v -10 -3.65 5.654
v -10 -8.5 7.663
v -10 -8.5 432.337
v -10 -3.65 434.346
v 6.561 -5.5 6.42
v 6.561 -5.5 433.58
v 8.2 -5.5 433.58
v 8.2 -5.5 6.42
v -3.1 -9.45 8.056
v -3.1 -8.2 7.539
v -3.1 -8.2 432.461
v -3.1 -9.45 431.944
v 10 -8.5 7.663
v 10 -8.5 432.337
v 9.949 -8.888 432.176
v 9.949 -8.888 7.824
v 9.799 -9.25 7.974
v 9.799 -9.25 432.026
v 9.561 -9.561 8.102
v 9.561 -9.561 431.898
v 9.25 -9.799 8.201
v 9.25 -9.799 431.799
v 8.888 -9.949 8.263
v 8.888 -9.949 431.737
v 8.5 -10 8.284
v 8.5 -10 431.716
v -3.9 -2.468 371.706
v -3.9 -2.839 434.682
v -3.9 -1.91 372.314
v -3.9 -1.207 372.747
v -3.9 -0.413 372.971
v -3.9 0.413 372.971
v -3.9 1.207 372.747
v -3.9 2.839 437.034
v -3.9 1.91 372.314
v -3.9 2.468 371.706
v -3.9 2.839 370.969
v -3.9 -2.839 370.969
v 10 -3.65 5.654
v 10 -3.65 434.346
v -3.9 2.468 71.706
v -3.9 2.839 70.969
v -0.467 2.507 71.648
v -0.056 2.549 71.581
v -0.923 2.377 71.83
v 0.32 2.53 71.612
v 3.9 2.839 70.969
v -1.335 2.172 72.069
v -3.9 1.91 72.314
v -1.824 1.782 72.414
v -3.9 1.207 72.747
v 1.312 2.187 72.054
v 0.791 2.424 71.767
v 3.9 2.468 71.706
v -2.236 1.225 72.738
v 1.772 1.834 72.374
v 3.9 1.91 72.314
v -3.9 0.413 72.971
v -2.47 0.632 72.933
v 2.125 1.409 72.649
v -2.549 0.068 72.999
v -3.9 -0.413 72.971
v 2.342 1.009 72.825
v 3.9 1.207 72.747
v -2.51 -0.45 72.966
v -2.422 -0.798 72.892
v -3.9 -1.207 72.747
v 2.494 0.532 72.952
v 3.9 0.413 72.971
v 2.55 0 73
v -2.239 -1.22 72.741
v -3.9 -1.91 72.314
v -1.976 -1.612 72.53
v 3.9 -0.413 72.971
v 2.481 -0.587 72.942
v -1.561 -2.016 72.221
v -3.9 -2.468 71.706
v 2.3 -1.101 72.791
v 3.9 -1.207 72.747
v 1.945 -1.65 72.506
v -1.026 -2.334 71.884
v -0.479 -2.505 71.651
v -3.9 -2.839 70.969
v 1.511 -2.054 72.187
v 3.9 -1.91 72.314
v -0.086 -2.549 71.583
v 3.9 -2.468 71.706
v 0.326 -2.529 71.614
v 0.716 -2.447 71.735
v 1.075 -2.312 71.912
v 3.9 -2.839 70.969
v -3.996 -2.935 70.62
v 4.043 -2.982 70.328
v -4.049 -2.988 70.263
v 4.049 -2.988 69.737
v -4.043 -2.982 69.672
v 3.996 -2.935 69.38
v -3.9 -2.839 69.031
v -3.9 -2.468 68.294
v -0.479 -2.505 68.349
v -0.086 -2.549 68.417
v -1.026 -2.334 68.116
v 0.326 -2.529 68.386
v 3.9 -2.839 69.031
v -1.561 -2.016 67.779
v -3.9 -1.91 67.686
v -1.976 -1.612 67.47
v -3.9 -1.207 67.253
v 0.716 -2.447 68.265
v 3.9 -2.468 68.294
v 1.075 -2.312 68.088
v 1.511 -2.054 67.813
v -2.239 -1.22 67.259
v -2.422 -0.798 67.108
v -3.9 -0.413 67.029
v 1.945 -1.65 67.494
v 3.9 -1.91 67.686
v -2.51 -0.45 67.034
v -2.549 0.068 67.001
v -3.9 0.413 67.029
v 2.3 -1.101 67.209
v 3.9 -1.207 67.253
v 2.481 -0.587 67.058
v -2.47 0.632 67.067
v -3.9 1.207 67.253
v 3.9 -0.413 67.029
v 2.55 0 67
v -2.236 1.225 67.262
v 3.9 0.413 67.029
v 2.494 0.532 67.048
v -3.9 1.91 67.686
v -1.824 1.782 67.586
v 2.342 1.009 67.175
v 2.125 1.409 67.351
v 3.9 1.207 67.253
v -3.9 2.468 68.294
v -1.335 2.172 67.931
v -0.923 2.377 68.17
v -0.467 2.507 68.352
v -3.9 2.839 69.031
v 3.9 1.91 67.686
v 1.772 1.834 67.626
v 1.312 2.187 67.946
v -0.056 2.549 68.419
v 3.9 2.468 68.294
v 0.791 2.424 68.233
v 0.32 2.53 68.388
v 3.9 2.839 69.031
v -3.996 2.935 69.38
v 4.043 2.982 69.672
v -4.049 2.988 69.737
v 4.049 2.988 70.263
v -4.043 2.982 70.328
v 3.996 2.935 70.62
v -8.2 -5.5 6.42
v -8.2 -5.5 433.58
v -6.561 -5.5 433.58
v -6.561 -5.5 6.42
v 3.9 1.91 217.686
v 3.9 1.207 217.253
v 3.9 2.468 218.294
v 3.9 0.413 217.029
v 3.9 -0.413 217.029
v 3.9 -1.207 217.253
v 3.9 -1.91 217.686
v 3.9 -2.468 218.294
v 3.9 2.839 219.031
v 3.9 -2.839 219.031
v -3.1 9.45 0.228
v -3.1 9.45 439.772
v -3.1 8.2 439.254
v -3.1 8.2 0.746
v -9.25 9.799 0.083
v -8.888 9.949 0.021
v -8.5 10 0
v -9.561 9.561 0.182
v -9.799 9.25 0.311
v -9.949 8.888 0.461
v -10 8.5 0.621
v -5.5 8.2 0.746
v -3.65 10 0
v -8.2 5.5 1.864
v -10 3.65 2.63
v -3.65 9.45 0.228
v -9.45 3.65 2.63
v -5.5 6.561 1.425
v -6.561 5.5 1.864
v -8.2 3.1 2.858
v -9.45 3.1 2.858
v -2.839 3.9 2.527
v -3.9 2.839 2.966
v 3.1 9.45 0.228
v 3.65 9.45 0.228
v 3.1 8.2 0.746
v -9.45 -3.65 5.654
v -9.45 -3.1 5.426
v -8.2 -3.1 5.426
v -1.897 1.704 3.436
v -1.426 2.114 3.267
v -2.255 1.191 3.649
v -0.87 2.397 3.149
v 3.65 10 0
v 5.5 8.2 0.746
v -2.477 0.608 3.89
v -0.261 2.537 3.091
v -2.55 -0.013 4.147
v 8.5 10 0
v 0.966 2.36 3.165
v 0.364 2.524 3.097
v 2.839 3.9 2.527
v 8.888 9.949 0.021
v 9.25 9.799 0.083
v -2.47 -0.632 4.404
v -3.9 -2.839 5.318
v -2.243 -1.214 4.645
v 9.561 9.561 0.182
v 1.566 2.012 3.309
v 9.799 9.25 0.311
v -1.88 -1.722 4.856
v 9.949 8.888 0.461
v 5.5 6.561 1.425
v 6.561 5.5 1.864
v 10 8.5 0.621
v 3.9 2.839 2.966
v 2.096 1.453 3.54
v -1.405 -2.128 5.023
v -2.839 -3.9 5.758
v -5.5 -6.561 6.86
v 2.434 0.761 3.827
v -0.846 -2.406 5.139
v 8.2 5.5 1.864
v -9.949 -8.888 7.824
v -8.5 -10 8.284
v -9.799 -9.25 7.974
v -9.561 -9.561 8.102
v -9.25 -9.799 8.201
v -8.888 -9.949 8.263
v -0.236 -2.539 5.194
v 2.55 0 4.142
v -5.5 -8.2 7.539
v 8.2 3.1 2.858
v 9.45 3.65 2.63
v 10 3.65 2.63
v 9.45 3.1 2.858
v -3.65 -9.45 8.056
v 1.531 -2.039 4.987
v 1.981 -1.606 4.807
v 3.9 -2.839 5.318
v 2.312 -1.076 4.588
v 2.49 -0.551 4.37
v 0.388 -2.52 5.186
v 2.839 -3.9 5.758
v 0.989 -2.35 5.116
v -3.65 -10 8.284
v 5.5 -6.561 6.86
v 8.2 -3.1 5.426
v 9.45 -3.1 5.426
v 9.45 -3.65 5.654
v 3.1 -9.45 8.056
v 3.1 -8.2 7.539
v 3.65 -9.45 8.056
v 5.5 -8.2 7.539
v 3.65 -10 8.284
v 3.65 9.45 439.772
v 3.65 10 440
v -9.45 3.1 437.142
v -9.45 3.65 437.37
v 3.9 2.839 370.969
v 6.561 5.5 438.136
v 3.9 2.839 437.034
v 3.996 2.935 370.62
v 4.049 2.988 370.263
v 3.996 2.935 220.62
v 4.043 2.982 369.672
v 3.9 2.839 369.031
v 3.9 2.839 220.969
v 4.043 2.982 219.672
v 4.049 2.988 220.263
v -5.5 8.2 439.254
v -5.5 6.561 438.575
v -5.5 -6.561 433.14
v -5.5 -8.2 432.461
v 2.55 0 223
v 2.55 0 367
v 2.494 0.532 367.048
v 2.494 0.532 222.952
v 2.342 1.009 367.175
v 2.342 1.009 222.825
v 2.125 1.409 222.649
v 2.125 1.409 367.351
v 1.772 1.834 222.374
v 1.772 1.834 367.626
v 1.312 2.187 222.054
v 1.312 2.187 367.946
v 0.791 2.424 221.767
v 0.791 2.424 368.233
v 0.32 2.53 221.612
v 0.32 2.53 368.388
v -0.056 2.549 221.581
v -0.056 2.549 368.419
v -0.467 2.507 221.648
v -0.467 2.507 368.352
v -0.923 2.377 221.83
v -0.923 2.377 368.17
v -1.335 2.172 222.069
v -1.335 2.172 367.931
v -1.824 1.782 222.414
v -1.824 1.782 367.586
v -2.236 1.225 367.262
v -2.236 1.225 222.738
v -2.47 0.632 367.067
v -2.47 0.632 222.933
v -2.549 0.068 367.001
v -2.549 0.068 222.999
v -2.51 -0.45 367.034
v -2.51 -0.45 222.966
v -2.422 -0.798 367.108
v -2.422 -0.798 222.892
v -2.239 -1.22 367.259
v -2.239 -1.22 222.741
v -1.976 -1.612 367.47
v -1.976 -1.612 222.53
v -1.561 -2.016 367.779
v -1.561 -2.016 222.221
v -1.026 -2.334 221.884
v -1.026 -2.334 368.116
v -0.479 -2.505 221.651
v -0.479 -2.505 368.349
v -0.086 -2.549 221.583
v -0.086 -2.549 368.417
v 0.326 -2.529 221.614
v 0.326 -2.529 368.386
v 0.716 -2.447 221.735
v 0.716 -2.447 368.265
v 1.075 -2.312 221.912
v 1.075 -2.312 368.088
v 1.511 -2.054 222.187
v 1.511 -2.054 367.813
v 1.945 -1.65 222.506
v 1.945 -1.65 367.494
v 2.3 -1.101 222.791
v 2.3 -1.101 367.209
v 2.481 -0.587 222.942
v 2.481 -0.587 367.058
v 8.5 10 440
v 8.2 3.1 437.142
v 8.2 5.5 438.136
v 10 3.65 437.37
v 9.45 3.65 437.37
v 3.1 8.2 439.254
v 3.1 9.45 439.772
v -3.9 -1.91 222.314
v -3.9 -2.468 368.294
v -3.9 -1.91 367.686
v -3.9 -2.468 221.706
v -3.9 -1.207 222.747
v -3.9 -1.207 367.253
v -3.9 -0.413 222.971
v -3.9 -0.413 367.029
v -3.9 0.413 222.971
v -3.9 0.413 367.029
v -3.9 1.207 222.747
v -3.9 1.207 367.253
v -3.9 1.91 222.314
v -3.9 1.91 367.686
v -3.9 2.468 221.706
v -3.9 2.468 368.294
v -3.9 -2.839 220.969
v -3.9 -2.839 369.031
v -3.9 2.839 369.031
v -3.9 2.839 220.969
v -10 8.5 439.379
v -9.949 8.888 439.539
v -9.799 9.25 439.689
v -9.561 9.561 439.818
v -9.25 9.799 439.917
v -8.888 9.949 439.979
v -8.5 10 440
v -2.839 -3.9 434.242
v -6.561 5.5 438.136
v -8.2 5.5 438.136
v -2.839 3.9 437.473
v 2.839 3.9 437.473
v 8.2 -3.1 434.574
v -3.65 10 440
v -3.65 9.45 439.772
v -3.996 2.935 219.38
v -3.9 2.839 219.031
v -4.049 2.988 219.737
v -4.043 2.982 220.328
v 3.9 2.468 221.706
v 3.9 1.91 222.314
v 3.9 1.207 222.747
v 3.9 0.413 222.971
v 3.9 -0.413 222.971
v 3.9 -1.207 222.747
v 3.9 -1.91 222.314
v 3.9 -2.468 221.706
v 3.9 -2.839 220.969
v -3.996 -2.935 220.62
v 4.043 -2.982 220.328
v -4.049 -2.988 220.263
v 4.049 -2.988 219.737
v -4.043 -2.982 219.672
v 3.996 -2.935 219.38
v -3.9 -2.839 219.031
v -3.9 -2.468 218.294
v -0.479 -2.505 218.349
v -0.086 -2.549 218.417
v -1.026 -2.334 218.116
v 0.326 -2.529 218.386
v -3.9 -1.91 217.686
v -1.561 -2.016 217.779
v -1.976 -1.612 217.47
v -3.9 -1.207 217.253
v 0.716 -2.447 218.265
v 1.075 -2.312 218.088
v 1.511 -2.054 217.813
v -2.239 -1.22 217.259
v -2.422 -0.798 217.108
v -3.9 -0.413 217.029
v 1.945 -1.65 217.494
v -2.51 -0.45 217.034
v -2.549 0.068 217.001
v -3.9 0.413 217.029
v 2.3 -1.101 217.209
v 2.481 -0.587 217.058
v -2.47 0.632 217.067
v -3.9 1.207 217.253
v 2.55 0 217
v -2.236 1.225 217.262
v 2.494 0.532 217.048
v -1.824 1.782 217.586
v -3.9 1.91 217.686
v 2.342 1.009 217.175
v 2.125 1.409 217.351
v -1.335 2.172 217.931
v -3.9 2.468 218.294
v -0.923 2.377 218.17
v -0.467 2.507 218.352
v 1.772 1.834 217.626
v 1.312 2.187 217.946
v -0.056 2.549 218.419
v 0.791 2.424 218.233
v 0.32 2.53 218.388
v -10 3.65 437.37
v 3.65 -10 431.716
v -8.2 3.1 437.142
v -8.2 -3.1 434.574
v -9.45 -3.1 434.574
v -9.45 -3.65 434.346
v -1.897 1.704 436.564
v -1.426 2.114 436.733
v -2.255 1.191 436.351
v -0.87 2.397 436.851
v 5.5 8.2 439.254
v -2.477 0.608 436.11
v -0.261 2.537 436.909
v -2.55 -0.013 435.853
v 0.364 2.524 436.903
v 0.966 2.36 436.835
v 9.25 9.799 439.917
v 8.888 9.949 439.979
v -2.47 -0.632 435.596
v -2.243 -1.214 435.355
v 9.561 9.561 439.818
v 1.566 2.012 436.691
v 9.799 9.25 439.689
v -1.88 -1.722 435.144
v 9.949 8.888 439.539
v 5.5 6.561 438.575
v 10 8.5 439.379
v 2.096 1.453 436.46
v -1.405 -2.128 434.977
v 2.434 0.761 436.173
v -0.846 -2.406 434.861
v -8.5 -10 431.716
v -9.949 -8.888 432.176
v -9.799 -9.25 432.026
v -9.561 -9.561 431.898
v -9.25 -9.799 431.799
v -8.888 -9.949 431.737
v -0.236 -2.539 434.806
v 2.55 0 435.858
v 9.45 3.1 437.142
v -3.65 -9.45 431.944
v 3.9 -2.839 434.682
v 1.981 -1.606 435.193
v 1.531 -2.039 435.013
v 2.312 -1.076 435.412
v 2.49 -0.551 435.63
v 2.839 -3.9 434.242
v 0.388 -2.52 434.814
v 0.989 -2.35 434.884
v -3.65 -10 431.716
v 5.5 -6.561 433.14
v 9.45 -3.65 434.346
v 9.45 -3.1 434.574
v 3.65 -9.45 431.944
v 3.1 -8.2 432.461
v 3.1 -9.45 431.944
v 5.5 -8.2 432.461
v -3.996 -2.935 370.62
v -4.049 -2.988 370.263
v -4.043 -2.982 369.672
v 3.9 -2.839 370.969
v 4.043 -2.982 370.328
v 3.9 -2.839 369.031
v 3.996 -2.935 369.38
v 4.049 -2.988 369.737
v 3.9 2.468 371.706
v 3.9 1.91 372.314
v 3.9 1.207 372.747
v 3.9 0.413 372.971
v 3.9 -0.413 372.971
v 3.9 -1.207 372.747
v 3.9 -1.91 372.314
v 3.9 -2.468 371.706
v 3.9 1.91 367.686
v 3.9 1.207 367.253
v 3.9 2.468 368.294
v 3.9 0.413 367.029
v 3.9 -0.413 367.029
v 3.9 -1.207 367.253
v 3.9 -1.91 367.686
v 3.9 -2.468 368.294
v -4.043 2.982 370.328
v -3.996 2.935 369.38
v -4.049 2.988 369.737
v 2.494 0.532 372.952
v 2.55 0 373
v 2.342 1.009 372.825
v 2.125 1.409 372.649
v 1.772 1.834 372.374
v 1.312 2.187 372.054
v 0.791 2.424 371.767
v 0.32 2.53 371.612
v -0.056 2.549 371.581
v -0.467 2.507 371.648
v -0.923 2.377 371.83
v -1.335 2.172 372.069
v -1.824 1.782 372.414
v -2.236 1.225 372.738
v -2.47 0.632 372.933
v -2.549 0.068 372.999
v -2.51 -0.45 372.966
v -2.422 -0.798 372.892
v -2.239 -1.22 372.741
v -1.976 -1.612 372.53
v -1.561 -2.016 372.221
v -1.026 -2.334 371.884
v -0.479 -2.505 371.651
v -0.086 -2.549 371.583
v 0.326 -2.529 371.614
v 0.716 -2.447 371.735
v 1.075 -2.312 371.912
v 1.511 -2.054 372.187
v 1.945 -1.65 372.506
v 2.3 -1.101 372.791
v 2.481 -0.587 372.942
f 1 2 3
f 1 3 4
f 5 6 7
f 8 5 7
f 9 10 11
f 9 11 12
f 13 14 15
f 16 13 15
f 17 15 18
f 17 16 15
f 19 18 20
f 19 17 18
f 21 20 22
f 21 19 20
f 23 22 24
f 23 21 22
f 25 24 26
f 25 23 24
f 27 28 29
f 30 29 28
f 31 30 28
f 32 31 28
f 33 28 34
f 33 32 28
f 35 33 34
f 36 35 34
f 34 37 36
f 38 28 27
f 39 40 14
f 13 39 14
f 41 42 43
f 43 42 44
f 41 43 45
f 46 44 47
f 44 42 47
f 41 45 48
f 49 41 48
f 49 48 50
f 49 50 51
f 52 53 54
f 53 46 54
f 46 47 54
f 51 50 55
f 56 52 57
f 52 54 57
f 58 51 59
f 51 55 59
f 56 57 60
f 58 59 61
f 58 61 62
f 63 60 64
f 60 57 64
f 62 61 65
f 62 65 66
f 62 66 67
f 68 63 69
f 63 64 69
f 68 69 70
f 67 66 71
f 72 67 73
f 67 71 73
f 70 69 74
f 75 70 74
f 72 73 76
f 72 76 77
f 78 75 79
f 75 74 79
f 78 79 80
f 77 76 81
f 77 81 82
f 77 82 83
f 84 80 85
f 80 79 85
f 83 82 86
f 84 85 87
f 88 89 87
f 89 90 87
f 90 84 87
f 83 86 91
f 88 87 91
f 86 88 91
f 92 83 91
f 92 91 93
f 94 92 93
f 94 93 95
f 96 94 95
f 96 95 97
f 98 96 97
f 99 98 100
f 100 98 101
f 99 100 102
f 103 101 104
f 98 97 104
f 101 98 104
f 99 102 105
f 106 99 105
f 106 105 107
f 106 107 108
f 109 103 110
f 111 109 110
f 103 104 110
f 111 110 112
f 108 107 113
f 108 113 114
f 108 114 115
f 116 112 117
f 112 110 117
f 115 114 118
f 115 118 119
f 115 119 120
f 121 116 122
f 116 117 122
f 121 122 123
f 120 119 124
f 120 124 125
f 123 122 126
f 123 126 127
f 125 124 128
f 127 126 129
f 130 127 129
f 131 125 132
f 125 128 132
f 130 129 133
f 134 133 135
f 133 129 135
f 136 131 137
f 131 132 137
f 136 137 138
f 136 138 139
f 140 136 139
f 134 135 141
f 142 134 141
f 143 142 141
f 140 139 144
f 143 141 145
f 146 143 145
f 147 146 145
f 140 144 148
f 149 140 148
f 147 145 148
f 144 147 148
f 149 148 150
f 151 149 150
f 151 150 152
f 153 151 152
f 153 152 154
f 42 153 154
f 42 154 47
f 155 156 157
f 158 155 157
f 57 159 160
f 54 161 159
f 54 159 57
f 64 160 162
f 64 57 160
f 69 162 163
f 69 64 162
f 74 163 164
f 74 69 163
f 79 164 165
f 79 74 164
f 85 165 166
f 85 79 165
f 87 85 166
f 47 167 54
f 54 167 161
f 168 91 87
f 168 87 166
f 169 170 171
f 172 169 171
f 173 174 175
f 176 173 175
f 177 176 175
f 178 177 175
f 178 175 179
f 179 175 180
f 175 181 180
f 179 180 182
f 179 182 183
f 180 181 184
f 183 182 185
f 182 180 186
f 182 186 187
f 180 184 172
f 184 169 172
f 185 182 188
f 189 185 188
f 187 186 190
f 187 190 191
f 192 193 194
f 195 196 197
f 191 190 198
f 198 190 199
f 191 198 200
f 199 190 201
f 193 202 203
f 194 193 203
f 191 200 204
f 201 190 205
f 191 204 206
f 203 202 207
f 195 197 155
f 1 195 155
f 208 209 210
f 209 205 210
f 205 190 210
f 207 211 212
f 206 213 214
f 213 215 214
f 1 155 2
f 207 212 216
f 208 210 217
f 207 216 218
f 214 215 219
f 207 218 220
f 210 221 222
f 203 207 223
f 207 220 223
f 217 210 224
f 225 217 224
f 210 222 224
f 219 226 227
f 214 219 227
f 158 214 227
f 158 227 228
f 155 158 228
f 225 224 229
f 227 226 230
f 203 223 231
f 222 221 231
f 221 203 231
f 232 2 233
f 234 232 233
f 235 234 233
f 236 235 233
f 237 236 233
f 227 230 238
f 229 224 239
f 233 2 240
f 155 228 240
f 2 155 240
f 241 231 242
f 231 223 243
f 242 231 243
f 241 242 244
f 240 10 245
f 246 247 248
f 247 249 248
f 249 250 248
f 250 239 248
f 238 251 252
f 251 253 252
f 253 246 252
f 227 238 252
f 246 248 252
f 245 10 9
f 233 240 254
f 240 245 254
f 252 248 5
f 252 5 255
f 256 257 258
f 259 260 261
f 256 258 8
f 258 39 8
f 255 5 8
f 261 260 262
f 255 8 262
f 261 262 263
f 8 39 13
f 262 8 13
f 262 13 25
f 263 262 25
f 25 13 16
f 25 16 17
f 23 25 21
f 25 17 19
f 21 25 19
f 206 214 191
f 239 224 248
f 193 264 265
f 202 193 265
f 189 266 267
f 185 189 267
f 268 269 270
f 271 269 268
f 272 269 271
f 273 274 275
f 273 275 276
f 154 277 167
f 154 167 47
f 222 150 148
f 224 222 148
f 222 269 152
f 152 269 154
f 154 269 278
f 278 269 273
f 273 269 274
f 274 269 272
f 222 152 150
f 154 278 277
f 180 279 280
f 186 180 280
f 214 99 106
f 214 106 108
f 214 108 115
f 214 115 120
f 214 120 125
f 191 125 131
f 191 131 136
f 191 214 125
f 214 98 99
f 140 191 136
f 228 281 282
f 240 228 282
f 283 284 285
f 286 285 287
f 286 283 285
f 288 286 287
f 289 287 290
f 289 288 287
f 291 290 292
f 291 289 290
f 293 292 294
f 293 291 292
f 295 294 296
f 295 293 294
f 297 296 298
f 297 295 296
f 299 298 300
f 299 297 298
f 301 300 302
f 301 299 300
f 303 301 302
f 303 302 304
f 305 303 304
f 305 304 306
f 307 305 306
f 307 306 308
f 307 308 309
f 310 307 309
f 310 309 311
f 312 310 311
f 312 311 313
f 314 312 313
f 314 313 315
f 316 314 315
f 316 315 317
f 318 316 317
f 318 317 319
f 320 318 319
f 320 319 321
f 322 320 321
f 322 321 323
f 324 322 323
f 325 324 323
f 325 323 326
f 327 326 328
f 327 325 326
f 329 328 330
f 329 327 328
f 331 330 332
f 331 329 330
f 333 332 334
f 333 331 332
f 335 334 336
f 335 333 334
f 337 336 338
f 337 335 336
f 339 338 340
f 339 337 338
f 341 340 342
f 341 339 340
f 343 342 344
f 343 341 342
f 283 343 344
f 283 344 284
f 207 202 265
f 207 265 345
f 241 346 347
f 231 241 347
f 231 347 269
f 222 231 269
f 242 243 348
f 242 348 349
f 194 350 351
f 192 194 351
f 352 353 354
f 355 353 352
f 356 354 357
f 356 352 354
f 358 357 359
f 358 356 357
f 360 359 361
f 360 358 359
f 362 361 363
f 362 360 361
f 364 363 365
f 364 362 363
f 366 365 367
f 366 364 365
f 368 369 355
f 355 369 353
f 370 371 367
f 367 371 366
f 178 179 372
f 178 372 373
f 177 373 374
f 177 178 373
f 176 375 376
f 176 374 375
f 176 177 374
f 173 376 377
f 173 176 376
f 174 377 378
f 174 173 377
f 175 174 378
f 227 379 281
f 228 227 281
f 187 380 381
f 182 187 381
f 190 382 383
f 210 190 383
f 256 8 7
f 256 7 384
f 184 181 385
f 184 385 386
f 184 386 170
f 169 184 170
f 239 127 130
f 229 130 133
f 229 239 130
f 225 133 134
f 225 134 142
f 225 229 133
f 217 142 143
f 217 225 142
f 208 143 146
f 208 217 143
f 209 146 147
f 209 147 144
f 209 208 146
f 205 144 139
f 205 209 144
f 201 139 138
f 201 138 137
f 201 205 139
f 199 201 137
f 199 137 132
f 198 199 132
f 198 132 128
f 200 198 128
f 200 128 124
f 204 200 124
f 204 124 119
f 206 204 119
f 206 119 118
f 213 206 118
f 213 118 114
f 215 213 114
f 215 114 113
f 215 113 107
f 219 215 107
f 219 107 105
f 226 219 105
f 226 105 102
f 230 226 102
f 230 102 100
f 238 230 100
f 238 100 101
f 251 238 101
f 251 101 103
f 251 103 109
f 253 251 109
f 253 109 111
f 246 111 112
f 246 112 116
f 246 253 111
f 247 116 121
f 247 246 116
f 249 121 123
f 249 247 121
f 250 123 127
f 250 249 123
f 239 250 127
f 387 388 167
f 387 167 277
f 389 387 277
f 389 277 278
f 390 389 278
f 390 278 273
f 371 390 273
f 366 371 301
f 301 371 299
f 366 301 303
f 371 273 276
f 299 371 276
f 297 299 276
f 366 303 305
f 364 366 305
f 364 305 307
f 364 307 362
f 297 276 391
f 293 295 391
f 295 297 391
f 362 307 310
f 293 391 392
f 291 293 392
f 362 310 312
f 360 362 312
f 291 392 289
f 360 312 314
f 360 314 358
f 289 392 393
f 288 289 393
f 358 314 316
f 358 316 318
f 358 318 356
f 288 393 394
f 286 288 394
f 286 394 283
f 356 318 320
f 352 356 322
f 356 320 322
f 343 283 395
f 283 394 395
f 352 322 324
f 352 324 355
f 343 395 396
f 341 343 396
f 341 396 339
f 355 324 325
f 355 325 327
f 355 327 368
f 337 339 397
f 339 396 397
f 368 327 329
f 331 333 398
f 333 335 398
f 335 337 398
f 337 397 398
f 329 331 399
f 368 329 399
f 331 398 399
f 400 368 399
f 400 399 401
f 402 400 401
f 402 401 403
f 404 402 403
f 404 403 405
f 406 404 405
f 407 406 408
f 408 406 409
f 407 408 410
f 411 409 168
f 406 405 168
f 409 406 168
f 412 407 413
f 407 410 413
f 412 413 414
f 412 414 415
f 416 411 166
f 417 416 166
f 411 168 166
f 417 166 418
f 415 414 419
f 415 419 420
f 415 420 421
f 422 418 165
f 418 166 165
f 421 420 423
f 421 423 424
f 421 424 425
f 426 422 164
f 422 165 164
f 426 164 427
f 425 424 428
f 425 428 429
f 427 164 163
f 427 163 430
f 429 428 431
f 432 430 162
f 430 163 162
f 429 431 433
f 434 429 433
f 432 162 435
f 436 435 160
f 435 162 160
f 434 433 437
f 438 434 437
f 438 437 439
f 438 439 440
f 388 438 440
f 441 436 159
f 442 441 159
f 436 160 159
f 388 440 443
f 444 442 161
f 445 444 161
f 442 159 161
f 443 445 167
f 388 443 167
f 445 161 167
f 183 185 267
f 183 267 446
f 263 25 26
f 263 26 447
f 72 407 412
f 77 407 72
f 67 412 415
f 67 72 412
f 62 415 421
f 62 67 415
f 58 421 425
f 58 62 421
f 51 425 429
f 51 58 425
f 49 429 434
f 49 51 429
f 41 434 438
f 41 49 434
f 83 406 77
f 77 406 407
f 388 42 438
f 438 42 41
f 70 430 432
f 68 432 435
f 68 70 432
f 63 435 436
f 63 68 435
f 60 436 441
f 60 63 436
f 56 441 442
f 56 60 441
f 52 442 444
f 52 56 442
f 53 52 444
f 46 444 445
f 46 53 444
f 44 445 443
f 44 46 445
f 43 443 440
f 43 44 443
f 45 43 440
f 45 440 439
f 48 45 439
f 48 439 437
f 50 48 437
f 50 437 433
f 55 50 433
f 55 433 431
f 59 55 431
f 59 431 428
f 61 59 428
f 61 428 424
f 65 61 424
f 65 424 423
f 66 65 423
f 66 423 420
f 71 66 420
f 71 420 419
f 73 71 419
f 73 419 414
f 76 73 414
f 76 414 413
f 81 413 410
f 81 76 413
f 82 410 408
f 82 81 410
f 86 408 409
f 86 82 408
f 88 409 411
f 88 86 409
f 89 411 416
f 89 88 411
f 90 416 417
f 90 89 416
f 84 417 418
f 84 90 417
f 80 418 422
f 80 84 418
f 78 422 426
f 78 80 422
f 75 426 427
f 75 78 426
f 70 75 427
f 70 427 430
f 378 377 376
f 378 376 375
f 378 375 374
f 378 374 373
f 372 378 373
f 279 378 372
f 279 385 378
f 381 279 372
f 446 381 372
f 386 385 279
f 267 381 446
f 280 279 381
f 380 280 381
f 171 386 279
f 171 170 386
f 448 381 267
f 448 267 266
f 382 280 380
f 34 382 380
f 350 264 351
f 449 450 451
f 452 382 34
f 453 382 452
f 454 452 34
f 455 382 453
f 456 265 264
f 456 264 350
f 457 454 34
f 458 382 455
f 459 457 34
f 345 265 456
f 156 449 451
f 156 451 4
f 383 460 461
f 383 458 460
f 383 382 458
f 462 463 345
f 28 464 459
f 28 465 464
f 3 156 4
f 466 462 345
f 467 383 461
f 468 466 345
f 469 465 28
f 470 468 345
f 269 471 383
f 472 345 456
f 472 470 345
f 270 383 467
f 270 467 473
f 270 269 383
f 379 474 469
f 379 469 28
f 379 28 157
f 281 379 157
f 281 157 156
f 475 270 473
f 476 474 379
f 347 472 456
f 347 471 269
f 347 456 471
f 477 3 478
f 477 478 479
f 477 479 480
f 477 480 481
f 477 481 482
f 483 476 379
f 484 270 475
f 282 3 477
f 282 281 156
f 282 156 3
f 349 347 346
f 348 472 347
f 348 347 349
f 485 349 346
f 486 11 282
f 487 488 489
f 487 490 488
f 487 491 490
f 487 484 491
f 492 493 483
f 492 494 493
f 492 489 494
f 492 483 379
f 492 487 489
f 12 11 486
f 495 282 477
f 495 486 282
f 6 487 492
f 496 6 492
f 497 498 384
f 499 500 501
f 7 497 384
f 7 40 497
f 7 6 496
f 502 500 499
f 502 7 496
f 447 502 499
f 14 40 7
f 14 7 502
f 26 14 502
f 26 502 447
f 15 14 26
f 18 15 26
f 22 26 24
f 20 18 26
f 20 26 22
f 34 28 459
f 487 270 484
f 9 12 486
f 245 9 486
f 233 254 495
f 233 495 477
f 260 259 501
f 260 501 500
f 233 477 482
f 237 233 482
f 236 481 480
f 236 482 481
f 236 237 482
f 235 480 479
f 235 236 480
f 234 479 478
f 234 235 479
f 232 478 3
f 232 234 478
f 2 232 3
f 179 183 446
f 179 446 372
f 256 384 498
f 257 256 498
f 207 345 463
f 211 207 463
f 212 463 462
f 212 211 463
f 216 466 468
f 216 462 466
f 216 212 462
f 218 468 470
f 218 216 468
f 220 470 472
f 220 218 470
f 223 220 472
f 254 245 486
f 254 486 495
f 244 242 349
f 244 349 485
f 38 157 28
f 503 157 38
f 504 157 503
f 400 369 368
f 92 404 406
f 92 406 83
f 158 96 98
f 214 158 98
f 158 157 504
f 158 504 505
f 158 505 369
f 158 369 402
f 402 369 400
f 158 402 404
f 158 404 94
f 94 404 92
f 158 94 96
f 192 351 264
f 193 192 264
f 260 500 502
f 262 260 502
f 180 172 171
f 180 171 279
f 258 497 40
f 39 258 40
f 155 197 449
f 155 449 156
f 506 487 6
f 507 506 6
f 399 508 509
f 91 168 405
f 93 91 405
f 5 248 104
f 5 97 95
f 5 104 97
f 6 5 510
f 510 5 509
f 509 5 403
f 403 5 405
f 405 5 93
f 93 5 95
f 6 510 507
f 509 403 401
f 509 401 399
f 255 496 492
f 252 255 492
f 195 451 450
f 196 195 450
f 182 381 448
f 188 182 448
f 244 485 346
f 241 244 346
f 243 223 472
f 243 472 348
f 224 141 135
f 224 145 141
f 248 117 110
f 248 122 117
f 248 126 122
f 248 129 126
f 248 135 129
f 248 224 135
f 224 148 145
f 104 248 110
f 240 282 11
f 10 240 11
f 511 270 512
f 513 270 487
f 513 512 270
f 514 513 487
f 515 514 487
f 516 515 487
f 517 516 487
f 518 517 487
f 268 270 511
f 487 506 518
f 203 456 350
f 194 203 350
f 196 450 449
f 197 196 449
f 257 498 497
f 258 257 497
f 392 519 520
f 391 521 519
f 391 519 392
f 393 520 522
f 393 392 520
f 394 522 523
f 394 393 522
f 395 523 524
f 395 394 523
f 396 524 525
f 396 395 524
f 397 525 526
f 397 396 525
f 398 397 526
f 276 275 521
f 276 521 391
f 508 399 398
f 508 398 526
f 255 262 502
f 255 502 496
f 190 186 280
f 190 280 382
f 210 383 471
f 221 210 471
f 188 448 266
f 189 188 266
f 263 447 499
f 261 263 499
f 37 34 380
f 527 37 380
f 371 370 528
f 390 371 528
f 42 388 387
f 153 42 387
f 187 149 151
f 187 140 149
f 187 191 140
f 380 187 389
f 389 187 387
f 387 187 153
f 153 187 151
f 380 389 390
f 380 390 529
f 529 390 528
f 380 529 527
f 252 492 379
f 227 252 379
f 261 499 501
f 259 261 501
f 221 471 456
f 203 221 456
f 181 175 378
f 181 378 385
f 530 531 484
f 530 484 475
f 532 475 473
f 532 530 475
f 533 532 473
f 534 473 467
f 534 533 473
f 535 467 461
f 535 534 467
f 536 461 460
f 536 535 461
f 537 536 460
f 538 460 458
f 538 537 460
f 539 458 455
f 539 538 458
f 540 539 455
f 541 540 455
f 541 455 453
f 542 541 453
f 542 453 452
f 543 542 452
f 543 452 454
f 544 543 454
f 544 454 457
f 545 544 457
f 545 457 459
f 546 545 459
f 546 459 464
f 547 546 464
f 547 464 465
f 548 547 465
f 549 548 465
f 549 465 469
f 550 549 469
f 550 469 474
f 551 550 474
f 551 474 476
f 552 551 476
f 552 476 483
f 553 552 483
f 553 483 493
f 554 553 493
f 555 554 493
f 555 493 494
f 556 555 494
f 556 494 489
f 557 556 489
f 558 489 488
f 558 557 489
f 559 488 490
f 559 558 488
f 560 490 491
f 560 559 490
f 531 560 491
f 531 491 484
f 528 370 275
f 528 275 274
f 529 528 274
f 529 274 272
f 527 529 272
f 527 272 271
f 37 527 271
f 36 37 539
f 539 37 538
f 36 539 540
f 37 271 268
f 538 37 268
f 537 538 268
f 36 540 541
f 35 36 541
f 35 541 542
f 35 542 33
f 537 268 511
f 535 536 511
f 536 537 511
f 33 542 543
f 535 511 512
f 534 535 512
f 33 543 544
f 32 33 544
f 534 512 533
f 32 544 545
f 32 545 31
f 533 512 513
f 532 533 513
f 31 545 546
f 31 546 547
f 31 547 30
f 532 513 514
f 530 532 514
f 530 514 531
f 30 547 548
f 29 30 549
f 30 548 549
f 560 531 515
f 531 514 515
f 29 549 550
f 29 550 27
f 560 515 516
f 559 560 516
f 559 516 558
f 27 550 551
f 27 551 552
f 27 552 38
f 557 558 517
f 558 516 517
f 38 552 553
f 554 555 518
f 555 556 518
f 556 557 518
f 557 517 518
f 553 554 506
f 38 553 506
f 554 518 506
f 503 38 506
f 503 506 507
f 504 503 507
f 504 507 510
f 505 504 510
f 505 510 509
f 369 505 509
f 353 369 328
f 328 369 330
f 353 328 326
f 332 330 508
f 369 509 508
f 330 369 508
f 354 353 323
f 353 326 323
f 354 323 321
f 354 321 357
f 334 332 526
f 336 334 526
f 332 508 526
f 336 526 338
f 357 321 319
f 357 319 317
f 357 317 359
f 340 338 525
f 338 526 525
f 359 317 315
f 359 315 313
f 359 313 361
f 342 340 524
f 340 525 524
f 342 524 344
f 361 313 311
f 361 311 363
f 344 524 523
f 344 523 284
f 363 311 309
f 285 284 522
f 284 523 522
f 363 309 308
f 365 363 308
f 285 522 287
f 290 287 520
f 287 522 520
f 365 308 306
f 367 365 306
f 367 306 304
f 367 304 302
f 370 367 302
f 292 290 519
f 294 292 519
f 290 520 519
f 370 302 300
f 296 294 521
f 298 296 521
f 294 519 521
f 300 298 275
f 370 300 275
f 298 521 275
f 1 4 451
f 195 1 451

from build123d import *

# Parameters (mm, degrees)
SKETCH_2_R          = 2.55
EXTRUDE_1_DEPTH     = 440
SKETCH_3_R          = 3
CUT_EXTRUDE_1_DEPTH = 441.567815438
CUT_EXTRUDE_2_DEPTH = 20


with BuildPart() as part:
    # 草图2 → 凸台-拉伸1 (new body)
    with BuildSketch(Plane.XY):
        with BuildLine():
            Line((-3.9, 2.839339828), (-6.560660172, 5.5))
            Line((-6.560660172, 5.5), (-8.2, 5.5))
            Line((-8.2, 5.5), (-8.2, 3.1))
            Line((-8.2, 3.1), (-9.45, 3.1))
            Line((-9.45, 3.1), (-9.45, 3.65))
            Line((-9.45, 3.65), (-10, 3.65))
            Line((-10, 3.65), (-10, 8.5))
            ThreePointArc((-10, 8.5), (-9.560660172, 9.560660172), (-8.5, 10))
            Line((-8.5, 10), (-3.65, 10))
            Line((-3.65, 10), (-3.65, 9.45))
            Line((-3.65, 9.45), (-3.1, 9.45))
            Line((-3.1, 9.45), (-3.1, 8.2))
            Line((-3.1, 8.2), (-5.5, 8.2))
            Line((-5.5, 8.2), (-5.5, 6.560660172))
            Line((-5.5, 6.560660172), (-2.839339828, 3.9))
            Line((-2.839339828, 3.9), (2.839339828, 3.9))
            Line((2.839339828, 3.9), (5.5, 6.560660172))
            Line((5.5, 6.560660172), (5.5, 8.2))
            Line((5.5, 8.2), (3.1, 8.2))
            Line((3.1, 8.2), (3.1, 9.45))
            Line((3.1, 9.45), (3.65, 9.45))
            Line((3.65, 9.45), (3.65, 10))
            Line((3.65, 10), (8.5, 10))
            ThreePointArc((8.5, 10), (9.560660172, 9.560660172), (10, 8.5))
            Line((10, 8.5), (10, 3.65))
            Line((10, 3.65), (9.45, 3.65))
            Line((9.45, 3.65), (9.45, 3.1))
            Line((9.45, 3.1), (8.2, 3.1))
            Line((8.2, 3.1), (8.2, 5.5))
            Line((8.2, 5.5), (6.560660172, 5.5))
            Line((6.560660172, 5.5), (3.9, 2.839339828))
            Line((3.9, 2.839339828), (3.9, -2.839339828))
            Line((3.9, -2.839339828), (6.560660172, -5.5))
            Line((6.560660172, -5.5), (8.2, -5.5))
            Line((8.2, -5.5), (8.2, -3.1))
            Line((8.2, -3.1), (9.45, -3.1))
            Line((9.45, -3.1), (9.45, -3.65))
            Line((9.45, -3.65), (10, -3.65))
            Line((10, -3.65), (10, -8.5))
            ThreePointArc((10, -8.5), (9.560660172, -9.560660172), (8.5, -10))
            Line((8.5, -10), (3.65, -10))
            Line((3.65, -10), (3.65, -9.45))
            Line((3.65, -9.45), (3.1, -9.45))
            Line((3.1, -9.45), (3.1, -8.2))
            Line((3.1, -8.2), (5.5, -8.2))
            Line((5.5, -8.2), (5.5, -6.560660172))
            Line((5.5, -6.560660172), (2.839339828, -3.9))
            Line((2.839339828, -3.9), (-2.839339828, -3.9))
            Line((-2.839339828, -3.9), (-5.5, -6.560660172))
            Line((-5.5, -6.560660172), (-5.5, -8.2))
            Line((-5.5, -8.2), (-3.1, -8.2))
            Line((-3.1, -8.2), (-3.1, -9.45))
            Line((-3.1, -9.45), (-3.65, -9.45))
            Line((-3.65, -9.45), (-3.65, -10))
            Line((-3.65, -10), (-8.5, -10))
            ThreePointArc((-8.5, -10), (-9.560660172, -9.560660172), (-10, -8.5))
            Line((-10, -8.5), (-10, -3.65))
            Line((-10, -3.65), (-9.45, -3.65))
            Line((-9.45, -3.65), (-9.45, -3.1))
            Line((-9.45, -3.1), (-8.2, -3.1))
            Line((-8.2, -3.1), (-8.2, -5.5))
            Line((-8.2, -5.5), (-6.560660172, -5.5))
            Line((-6.560660172, -5.5), (-3.9, -2.839339828))
            Line((-3.9, -2.839339828), (-3.9, 2.839339828))
        make_face()
        Circle(SKETCH_2_R, mode=Mode.SUBTRACT)
    extrude(amount=EXTRUDE_1_DEPTH)

    # 草图3 → 切除-拉伸1 (cut, through all)
    with BuildSketch(Plane(origin=(10, 0, 0), x_dir=(0, 0, -1), z_dir=(1, 0, 0))):
        with Locations(Location((-70, 0, 0), (0, 0, 108.835996158))):
            Circle(SKETCH_3_R)
        with Locations(Location((-370, 0, 0), (0, 0, 71.164003842))):
            Circle(SKETCH_3_R)
        with Locations(Location((-220, 0, 0), (0, 0, 71.164003842))):
            Circle(SKETCH_3_R)
    extrude(amount=-CUT_EXTRUDE_1_DEPTH, mode=Mode.SUBTRACT)

    # 草图5 → 切除-拉伸2 (cut)
    with BuildSketch(Plane(origin=(10, 0, 0), x_dir=(0, 0, -1), z_dir=(1, 0, 0))):
        Polygon((-440, 10), (-431.715728753, -10), (-440, -10), align=None)
        Polygon((0, 10), (-8.284271247, -10), (0, -10), align=None)
    extrude(amount=-CUT_EXTRUDE_2_DEPTH, mode=Mode.SUBTRACT)


solid = part.part
